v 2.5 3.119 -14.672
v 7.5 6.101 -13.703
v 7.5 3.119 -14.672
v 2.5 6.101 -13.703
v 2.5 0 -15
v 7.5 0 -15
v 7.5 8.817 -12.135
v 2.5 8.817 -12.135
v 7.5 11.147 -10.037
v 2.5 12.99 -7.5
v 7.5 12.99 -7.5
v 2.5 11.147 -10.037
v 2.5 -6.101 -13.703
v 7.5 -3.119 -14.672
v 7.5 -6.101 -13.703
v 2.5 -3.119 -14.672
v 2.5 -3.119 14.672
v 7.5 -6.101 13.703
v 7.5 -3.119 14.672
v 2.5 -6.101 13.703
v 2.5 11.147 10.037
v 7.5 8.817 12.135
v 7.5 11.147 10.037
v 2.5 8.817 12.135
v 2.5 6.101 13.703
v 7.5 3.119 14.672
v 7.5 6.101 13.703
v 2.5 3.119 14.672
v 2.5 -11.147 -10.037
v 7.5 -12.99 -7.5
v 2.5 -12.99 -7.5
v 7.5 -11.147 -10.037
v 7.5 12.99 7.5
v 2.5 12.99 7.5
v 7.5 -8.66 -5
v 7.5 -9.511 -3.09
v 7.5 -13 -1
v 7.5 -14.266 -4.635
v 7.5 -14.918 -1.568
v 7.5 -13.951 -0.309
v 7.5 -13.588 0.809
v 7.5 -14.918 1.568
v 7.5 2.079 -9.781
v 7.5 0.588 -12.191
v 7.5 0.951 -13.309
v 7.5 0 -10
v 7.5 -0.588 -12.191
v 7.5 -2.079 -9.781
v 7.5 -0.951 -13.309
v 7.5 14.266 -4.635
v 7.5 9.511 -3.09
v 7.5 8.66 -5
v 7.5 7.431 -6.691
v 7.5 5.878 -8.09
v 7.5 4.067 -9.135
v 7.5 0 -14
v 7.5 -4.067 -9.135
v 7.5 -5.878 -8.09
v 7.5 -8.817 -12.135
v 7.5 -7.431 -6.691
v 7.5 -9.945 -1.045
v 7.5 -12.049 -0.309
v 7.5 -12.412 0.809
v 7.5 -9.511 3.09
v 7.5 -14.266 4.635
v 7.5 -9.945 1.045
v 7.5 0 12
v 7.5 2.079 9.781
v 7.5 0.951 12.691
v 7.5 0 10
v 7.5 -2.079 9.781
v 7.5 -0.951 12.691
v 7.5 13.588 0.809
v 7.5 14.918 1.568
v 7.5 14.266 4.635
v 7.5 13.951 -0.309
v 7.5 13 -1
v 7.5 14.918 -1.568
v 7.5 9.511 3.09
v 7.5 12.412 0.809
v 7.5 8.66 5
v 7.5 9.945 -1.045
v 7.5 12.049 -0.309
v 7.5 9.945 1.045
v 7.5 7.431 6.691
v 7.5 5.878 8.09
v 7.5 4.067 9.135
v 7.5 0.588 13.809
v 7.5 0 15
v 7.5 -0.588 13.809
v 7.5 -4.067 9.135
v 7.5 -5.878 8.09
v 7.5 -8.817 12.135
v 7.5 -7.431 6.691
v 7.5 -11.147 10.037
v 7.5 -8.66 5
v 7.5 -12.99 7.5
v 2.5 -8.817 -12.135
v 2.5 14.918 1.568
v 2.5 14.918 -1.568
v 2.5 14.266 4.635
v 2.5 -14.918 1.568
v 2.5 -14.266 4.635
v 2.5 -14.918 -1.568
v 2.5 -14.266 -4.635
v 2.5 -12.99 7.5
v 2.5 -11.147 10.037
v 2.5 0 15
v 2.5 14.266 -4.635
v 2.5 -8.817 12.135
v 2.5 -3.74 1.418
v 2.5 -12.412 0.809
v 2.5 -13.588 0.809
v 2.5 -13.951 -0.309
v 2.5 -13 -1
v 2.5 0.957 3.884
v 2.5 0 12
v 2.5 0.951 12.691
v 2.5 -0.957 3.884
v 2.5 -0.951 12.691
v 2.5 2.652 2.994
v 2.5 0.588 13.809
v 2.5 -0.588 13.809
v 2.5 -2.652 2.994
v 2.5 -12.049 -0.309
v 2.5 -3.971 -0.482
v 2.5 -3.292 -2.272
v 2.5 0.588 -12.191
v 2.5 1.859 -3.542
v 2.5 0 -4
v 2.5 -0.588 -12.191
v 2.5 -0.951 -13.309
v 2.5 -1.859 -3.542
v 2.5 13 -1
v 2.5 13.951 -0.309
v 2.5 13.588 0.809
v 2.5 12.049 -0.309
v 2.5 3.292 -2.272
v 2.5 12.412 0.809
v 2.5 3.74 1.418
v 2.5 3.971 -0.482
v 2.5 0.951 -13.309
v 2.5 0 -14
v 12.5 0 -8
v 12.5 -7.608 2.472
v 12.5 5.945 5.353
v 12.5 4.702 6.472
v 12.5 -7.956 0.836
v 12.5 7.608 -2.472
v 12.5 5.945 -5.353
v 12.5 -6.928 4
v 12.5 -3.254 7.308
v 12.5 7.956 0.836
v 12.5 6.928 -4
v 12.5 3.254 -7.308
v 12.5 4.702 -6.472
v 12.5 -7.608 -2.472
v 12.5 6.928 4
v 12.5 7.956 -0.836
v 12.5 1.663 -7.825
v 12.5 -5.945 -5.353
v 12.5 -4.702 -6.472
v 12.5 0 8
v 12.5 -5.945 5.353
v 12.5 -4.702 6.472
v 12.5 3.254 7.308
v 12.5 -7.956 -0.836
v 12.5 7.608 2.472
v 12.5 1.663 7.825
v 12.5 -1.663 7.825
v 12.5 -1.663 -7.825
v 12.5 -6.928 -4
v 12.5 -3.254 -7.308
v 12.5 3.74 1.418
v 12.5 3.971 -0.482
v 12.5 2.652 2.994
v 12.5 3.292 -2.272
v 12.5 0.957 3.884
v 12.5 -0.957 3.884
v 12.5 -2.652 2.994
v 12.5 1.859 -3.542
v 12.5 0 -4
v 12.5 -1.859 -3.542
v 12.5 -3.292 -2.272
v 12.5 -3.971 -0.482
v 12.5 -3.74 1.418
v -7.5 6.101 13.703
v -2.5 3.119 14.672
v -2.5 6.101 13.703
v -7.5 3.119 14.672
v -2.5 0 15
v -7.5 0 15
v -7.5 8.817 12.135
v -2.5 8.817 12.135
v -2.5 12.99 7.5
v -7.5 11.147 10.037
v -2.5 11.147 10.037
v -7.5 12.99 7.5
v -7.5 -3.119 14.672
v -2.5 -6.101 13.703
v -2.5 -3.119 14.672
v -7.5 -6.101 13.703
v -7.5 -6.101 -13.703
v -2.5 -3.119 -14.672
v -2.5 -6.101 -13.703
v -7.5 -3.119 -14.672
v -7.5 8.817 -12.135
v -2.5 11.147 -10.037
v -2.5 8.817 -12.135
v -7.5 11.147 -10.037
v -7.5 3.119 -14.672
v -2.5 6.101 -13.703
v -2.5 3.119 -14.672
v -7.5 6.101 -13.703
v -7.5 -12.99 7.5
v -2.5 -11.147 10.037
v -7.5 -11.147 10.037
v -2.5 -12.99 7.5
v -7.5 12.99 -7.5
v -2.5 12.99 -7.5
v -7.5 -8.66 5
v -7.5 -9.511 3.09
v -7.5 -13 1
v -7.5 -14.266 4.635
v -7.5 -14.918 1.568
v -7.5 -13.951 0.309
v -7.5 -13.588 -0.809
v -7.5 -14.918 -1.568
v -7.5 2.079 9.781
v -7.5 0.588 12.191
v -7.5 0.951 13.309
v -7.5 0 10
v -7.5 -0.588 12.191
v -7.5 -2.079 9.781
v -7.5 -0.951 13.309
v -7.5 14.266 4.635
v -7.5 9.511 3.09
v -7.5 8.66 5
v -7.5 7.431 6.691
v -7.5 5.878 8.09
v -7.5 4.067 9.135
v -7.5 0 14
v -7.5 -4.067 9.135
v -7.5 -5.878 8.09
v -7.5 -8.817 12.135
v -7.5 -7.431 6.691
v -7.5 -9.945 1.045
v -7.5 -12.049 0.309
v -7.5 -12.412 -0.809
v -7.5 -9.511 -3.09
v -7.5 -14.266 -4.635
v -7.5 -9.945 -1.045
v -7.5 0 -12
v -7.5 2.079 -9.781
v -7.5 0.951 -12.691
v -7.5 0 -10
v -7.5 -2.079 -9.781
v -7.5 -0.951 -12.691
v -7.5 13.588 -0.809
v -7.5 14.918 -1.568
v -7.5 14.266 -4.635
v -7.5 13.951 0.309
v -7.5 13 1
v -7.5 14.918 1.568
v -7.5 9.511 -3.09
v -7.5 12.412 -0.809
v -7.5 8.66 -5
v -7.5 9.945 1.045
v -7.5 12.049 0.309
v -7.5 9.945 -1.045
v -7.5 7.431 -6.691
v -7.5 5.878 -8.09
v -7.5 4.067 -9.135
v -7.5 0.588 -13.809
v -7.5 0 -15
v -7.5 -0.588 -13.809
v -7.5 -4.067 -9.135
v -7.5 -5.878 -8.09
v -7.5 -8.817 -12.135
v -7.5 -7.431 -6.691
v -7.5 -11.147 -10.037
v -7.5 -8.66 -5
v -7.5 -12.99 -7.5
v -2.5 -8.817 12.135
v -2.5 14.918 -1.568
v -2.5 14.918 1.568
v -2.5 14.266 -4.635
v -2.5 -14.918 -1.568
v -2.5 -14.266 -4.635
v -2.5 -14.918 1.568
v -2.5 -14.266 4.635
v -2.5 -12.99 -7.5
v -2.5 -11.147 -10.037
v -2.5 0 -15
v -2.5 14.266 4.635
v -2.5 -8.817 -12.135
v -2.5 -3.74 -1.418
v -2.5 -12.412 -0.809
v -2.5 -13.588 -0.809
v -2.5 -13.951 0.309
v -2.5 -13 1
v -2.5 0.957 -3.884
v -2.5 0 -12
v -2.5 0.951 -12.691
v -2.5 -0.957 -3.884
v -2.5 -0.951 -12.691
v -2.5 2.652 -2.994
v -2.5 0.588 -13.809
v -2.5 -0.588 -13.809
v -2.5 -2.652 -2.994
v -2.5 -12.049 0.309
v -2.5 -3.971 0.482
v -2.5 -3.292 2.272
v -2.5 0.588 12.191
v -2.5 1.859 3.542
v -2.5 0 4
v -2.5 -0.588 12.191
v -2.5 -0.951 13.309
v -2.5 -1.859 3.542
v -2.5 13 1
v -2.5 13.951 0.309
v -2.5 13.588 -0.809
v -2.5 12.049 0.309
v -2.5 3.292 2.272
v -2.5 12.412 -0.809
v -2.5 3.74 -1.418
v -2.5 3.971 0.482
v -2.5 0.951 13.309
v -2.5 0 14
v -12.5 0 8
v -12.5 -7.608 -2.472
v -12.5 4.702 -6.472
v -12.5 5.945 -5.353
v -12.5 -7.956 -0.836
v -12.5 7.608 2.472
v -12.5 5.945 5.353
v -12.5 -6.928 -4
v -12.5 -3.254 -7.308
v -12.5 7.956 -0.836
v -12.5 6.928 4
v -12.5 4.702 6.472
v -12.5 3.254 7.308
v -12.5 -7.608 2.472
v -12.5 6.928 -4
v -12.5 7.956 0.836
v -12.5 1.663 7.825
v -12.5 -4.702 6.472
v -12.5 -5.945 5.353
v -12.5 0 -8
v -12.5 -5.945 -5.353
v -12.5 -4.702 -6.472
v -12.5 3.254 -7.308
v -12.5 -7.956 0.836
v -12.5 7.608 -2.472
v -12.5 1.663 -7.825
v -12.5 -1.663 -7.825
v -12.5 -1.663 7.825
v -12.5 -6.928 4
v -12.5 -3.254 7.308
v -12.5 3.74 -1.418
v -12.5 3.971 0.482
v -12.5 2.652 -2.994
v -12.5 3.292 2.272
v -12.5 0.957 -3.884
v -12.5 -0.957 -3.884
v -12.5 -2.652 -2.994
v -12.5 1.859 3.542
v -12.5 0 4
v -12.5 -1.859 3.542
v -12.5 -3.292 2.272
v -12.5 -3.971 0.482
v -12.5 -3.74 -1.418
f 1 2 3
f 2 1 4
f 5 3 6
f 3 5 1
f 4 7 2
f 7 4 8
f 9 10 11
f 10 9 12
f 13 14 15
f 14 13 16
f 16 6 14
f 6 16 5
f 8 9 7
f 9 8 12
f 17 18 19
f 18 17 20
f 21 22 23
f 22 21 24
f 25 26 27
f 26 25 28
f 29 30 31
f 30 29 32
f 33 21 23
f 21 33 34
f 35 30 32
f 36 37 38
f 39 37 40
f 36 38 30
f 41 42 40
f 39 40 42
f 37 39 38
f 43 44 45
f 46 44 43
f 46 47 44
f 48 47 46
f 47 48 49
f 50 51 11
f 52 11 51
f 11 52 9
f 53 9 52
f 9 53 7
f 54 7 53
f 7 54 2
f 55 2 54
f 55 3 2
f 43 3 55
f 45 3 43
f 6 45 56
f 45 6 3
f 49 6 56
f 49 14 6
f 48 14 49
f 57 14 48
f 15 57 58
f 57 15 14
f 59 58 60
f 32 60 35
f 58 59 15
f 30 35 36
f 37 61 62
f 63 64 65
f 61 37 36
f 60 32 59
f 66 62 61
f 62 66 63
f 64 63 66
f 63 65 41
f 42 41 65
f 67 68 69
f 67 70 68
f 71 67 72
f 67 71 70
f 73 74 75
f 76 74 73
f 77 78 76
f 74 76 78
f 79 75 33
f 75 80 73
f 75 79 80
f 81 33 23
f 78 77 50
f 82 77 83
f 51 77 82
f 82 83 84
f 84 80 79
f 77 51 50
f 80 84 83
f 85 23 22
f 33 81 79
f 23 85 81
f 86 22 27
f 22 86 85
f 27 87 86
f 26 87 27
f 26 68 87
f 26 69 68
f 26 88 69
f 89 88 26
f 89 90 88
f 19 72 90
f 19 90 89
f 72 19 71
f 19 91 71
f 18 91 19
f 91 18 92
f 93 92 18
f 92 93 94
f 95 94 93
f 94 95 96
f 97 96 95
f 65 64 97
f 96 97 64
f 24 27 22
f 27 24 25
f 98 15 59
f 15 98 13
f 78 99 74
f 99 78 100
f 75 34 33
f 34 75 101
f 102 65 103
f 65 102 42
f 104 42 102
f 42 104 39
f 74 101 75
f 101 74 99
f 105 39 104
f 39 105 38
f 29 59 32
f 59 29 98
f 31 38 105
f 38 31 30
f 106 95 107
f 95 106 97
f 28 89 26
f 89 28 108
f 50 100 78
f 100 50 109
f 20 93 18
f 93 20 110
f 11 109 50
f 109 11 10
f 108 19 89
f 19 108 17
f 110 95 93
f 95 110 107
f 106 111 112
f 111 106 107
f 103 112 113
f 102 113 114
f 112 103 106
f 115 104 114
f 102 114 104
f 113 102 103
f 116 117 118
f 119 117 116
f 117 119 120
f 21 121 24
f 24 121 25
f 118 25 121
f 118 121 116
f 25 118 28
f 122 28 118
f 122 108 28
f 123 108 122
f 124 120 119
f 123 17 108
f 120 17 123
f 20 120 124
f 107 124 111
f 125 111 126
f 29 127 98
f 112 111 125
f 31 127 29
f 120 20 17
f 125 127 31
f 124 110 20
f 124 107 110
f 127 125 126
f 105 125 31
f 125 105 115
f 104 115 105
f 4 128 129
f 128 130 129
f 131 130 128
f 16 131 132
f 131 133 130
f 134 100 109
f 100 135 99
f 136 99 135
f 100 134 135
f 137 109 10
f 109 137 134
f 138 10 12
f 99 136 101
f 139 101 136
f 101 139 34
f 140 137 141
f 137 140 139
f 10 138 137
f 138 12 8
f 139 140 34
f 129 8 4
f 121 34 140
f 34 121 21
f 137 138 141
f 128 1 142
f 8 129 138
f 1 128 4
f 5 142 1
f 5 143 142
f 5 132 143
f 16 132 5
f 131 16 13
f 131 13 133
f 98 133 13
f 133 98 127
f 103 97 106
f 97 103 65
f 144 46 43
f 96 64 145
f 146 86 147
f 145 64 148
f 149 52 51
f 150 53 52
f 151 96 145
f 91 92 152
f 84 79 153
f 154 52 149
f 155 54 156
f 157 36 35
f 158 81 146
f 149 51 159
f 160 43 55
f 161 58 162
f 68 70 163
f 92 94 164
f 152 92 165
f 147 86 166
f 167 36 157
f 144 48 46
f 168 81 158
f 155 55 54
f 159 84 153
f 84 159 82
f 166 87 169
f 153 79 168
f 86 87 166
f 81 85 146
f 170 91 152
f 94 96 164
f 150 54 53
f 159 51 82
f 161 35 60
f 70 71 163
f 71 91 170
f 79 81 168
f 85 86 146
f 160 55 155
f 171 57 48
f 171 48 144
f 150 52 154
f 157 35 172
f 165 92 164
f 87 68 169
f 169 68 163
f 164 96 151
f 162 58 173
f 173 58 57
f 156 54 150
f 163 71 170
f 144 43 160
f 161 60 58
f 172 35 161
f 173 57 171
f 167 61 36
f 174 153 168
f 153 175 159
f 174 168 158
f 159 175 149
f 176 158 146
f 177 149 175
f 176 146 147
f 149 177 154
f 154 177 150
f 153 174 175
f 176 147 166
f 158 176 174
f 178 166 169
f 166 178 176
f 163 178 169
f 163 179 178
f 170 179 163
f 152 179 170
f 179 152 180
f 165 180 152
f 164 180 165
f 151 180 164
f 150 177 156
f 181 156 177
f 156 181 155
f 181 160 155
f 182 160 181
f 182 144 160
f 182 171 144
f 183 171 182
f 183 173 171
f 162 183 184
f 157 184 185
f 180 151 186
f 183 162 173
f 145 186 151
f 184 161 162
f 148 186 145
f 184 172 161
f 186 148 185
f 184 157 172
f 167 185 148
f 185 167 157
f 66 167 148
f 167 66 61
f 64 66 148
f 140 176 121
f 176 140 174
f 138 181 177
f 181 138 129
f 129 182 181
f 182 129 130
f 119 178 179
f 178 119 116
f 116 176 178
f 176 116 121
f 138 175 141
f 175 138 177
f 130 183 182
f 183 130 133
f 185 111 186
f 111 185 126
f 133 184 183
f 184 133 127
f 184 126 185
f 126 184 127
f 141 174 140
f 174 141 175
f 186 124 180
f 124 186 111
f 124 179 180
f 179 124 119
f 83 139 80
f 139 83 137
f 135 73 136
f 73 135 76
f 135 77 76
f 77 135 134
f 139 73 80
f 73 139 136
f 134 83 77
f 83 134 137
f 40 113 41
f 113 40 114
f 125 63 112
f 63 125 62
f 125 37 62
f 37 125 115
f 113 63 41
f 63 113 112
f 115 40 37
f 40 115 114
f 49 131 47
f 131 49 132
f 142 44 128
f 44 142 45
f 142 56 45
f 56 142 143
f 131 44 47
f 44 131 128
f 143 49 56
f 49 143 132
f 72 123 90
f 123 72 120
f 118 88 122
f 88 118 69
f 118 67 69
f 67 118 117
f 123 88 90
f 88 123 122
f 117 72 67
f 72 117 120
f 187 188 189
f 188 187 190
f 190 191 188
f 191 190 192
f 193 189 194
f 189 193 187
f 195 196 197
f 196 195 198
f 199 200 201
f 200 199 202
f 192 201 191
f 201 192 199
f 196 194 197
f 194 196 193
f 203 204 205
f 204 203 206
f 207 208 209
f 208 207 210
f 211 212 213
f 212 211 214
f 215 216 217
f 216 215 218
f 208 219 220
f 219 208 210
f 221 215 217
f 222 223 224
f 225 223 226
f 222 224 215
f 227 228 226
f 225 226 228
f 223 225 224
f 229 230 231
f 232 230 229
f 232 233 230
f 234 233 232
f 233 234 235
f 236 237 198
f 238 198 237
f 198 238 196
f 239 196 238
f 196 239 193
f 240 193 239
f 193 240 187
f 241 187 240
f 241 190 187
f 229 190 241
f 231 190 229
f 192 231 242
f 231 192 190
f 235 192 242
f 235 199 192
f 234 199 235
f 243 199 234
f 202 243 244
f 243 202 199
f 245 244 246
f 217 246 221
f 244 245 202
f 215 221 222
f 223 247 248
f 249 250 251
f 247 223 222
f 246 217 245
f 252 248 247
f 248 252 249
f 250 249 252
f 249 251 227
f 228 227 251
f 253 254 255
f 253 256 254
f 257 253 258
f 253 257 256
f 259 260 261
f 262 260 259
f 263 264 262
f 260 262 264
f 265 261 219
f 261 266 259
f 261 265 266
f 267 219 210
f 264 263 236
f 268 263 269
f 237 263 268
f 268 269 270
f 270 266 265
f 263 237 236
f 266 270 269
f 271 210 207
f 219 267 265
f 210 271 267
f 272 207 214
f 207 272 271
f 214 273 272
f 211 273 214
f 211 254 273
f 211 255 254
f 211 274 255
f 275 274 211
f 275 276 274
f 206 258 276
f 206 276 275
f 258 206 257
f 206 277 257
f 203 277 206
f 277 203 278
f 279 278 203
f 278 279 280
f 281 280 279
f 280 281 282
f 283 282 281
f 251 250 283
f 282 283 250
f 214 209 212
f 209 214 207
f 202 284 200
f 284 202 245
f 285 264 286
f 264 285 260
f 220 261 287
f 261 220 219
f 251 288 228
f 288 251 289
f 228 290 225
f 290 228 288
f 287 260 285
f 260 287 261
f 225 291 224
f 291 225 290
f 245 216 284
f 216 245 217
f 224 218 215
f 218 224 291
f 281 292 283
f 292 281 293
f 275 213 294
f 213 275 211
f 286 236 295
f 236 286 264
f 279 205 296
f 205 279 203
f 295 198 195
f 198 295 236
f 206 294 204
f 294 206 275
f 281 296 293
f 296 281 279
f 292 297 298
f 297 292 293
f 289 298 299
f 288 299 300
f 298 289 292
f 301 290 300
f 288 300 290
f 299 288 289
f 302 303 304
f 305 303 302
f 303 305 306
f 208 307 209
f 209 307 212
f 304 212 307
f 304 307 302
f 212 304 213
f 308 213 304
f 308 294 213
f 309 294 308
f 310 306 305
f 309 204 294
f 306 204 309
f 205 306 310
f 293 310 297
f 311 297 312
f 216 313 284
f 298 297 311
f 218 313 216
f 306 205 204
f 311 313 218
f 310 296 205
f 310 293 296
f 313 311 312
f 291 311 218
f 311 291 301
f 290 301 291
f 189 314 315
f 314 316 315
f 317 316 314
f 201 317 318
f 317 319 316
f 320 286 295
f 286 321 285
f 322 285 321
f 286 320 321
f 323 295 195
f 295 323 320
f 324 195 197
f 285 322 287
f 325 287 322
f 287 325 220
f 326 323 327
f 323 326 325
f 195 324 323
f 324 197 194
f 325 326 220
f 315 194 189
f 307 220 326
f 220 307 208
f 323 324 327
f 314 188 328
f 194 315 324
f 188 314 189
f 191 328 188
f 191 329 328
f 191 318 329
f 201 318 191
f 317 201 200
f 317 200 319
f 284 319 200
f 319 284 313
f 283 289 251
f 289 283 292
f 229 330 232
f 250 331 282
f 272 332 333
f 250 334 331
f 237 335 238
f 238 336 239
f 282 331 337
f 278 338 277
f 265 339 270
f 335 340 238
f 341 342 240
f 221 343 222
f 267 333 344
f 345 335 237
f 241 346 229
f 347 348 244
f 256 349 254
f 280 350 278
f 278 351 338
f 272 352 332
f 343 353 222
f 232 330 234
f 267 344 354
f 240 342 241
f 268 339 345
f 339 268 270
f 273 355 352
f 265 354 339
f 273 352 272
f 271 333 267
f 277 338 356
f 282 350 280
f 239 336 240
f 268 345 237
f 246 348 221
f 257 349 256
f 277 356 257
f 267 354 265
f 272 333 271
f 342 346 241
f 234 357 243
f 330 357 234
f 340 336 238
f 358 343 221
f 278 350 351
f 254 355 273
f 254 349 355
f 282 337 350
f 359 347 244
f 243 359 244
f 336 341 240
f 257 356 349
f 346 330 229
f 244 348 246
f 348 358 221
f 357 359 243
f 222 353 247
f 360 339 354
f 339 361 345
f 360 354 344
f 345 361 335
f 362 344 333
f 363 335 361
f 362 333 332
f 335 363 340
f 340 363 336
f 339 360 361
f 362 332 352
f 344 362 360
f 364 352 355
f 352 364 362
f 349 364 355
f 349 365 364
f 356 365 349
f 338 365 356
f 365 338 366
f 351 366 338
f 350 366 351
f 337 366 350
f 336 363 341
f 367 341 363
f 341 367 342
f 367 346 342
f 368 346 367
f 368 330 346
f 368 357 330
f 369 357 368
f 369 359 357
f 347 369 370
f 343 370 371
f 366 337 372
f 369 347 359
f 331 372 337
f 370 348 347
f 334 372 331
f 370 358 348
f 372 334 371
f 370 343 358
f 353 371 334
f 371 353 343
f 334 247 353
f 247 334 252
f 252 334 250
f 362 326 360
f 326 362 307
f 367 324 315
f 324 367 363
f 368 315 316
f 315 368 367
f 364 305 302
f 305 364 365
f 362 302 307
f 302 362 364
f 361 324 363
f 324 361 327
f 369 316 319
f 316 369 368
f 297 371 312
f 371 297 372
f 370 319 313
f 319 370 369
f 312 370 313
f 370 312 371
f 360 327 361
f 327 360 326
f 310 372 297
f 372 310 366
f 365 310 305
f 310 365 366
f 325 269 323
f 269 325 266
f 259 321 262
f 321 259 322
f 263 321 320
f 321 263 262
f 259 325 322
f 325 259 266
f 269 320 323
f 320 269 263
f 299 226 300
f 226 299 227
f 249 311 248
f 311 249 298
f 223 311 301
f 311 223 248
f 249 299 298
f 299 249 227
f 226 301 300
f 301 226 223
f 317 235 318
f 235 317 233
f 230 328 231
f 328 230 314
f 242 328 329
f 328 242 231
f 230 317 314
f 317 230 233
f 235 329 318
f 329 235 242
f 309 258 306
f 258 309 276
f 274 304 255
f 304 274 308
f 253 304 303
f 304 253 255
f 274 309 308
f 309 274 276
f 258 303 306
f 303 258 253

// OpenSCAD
high_quality=true;
bottom_cyl_dia=15; // mm
bottom_cyl_height=5;
top_cyl_dia=10;
top_cyl_height=5;
screen_cutout=4;
screw_dia=1;
if(high_quality){
    $fn=150;
}
else{
    $fn=50;
}

module makeBottom(){
    cylinder(r=bottom_cyl_dia, h=bottom_cyl_height);
}

module makeTop(){
    translate([0,0,bottom_cyl_height])cylinder(r1=top_cyl_dia, r2=top_cyl_dia*0.8, h=bottom_cyl_height);
}

module makeBase(){
    makeBottom();
    makeTop();
}
module cutHoles(){
    
    difference(){
        makeBase();
        cylinder(r=screen_cutout,h=bottom_cyl_height+top_cyl_height);
        translate([0,13,0]) cylinder(r=screw_dia,h=bottom_cyl_height);
        translate([0,-13,0]) cylinder(r=screw_dia,h=bottom_cyl_height);
        translate([13,0,0]) cylinder(r=screw_dia,h=bottom_cyl_height);
        translate([-13,0,0]) cylinder(r=screw_dia,h=bottom_cyl_height);
    }
}
module makeHalfChamber(){
    cutHoles();
}

module makeShowModel(spaced, spacing=2.5){
    if (spaced){
        translate([spacing,0,0])rotate([0,90,0])makeHalfChamber();
        translate([-spacing,0,0])rotate([0,-90,0])makeHalfChamber();
    }
    else{
        rotate([0,90,0])makeHalfChamber();
        rotate([0,-90,0])makeHalfChamber();
    }
    
}

makeShowModel(spaced=true);
